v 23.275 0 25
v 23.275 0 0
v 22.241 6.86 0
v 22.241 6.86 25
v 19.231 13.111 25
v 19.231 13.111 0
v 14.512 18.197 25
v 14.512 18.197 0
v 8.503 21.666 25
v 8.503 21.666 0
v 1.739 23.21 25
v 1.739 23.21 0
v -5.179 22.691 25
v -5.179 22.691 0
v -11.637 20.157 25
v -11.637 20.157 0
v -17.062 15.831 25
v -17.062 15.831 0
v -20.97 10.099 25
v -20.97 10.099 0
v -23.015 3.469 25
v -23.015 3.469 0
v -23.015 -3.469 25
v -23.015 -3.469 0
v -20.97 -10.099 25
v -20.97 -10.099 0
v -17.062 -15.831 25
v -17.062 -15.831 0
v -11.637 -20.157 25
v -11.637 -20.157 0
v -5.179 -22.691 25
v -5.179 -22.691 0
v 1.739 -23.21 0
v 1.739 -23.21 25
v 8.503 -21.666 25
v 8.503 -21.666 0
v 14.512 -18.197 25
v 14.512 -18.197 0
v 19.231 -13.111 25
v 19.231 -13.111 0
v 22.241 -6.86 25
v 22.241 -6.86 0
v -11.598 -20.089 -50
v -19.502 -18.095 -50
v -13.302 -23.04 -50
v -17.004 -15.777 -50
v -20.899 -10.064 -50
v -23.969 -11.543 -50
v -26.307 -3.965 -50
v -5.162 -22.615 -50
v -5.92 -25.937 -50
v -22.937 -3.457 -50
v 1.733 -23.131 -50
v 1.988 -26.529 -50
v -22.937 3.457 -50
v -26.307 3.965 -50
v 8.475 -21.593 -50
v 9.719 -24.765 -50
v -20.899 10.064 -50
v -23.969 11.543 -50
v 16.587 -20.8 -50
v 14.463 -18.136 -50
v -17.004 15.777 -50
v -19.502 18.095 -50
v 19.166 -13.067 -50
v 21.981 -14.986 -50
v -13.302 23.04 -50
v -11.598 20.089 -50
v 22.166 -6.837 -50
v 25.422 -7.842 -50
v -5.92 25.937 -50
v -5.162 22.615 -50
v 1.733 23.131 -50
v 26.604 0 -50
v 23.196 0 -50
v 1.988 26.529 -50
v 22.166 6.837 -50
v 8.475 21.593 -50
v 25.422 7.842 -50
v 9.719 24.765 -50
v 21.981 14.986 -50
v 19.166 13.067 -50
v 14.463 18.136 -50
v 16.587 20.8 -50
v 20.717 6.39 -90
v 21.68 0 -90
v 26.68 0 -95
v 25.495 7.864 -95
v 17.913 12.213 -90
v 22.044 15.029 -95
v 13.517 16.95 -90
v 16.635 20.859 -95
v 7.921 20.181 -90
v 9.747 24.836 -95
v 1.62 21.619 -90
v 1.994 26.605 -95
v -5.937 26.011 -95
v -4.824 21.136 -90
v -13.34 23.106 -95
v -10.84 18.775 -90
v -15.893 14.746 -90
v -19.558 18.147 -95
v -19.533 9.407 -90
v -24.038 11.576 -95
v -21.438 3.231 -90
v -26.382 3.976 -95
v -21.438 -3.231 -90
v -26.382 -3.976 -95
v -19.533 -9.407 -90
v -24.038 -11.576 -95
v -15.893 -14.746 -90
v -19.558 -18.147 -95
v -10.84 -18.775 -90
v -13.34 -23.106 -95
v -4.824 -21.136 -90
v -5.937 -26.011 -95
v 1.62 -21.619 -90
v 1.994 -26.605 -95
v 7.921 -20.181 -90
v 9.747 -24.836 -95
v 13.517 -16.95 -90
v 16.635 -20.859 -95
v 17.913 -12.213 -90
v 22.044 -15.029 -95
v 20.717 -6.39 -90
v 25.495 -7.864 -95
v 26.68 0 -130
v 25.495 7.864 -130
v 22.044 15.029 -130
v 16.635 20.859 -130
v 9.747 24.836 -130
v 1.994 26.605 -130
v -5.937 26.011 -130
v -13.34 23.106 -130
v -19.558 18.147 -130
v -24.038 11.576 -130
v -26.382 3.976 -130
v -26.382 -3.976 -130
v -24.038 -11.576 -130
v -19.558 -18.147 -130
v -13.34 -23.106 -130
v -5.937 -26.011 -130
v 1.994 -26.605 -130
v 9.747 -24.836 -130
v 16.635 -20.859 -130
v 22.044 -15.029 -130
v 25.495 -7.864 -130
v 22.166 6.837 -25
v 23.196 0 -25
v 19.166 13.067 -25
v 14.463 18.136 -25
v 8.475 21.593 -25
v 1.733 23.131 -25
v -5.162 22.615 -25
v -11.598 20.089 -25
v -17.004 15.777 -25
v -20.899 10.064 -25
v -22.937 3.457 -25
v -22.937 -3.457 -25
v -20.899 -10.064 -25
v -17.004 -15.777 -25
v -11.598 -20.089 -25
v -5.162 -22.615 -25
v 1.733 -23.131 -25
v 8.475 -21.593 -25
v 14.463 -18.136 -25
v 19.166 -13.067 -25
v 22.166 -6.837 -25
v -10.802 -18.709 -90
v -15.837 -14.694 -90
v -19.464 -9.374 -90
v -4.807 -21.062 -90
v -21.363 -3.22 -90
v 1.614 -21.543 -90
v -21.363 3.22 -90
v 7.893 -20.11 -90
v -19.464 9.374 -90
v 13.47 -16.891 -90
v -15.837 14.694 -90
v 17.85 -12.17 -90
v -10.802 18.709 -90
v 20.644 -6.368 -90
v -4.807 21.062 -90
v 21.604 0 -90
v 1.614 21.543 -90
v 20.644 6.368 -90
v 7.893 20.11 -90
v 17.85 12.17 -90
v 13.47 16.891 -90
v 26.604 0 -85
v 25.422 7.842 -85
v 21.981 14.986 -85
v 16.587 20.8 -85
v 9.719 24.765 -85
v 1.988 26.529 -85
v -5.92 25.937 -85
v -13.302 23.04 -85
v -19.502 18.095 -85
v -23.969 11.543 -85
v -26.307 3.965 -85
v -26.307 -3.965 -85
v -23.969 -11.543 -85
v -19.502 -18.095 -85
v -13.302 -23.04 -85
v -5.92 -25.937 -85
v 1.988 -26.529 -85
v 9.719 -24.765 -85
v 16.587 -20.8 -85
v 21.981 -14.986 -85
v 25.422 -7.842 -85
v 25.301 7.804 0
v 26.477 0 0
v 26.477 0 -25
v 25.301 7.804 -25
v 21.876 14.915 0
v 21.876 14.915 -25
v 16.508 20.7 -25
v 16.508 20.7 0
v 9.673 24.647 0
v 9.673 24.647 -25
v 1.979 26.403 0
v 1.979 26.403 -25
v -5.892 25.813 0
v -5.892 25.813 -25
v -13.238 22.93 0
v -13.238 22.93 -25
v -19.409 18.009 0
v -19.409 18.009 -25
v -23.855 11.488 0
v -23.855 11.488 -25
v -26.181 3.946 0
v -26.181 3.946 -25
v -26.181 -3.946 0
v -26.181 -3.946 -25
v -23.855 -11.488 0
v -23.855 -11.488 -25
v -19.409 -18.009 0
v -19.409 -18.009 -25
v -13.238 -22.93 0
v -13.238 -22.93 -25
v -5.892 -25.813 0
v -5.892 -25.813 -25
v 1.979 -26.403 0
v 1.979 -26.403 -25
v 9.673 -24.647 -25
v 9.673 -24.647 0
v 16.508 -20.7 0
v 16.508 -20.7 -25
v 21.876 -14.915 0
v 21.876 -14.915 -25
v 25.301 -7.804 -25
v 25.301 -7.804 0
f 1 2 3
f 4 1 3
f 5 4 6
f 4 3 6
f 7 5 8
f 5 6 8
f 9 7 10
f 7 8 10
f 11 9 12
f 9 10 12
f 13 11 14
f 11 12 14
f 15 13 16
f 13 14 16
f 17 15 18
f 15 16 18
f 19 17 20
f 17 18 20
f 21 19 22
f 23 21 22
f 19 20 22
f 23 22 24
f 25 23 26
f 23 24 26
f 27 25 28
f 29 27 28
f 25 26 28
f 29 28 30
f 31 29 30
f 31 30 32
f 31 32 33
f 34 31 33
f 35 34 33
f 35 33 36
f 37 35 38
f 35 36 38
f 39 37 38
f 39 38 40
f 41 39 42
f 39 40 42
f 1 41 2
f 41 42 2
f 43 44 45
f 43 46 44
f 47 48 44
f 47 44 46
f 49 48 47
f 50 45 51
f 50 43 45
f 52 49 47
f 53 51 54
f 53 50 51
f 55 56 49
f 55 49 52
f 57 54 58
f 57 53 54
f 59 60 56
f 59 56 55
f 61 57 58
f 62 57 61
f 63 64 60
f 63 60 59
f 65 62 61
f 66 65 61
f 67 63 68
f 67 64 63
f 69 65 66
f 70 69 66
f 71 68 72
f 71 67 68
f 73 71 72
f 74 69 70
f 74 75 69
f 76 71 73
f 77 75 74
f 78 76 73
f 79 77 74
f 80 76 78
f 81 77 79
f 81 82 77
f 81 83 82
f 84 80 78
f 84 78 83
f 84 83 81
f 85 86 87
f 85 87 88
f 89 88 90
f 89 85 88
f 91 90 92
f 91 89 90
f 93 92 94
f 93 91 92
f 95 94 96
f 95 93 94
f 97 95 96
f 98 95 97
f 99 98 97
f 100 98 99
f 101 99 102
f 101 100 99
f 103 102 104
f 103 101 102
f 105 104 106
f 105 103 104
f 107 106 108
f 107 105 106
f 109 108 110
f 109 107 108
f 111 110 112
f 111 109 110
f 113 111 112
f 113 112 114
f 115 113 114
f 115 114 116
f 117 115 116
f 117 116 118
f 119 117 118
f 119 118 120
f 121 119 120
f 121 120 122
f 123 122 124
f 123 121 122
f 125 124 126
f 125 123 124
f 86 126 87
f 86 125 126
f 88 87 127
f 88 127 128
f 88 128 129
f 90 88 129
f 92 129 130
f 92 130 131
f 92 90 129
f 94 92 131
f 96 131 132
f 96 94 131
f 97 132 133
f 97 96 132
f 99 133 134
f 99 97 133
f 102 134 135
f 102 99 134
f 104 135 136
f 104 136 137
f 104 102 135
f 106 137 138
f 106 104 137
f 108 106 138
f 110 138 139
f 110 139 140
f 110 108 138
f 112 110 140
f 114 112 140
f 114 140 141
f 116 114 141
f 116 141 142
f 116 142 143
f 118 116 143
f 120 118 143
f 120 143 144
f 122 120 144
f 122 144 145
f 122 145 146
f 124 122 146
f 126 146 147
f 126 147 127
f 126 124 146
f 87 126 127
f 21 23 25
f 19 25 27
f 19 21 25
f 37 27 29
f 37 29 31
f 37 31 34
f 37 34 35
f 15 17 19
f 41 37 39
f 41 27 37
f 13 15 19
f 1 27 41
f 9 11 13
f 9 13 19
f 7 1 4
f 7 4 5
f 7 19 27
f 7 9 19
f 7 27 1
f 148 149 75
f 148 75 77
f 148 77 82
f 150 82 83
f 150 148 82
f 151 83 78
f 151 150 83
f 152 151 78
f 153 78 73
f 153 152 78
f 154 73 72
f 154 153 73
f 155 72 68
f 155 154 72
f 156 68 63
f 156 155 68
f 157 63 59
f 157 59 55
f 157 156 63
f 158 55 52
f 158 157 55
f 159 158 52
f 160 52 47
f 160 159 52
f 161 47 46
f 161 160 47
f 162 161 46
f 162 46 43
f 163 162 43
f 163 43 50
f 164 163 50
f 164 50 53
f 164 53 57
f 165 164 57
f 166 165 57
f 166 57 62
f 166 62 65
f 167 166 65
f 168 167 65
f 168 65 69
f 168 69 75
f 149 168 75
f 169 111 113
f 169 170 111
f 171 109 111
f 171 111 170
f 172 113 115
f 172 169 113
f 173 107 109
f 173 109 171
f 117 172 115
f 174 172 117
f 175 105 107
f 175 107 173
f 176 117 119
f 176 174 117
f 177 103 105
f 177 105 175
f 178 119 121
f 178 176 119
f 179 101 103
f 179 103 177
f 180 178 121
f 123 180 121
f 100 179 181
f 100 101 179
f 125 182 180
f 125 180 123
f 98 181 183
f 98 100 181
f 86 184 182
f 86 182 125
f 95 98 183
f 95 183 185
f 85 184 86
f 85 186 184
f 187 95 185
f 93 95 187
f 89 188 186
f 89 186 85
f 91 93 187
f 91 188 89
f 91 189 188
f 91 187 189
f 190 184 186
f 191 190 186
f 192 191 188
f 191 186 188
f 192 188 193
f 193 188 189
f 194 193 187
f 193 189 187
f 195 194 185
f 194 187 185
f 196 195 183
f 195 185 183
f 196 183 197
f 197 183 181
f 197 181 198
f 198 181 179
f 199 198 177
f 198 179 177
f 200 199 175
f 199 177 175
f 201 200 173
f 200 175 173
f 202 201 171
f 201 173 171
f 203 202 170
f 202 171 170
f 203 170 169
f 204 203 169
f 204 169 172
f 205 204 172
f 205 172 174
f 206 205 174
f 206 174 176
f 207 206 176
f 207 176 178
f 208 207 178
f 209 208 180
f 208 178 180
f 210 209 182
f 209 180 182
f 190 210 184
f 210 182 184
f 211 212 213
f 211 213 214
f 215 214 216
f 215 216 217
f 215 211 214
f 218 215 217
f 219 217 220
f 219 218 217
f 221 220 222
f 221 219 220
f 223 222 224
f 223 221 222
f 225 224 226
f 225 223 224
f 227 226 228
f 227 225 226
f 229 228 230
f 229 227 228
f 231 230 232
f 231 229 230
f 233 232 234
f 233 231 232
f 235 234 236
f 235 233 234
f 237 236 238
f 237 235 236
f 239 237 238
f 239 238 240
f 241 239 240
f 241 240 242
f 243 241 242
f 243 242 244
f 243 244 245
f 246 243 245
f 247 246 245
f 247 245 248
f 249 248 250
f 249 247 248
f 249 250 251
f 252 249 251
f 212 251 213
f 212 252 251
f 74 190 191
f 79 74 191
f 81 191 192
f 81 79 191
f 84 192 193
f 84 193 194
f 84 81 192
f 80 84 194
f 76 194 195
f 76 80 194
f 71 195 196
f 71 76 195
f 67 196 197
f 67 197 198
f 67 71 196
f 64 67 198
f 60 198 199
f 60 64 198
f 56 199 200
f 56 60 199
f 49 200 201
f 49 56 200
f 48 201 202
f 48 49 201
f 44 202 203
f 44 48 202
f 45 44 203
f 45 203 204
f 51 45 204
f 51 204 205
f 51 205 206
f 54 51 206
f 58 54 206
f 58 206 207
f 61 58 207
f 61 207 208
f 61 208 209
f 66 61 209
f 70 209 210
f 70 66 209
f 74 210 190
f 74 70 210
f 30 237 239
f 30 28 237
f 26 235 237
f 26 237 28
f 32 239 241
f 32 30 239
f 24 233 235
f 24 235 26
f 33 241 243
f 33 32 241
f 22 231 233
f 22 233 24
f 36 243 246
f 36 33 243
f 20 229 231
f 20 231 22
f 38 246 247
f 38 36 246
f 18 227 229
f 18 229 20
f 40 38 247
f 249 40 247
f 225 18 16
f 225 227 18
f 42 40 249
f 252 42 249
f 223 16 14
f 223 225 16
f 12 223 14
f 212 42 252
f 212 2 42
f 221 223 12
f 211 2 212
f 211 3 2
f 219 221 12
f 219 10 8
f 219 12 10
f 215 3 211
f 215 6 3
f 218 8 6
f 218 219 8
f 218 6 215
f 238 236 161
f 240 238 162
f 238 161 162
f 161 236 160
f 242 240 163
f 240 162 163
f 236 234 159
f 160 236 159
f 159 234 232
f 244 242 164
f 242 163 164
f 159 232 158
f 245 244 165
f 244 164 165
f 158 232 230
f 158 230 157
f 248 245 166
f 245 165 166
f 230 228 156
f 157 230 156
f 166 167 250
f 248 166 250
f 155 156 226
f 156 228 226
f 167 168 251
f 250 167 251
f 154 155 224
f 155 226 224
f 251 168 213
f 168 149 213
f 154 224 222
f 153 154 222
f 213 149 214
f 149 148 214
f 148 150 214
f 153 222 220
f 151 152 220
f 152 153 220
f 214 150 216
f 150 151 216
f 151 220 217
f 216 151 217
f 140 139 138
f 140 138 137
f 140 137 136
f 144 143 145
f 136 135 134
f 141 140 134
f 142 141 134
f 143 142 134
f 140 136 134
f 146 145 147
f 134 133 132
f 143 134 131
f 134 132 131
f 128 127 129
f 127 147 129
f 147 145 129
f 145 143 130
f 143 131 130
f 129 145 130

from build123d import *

# Parameters (mm, degrees)
F0_R      = 23.274843
F1_DEPTH  = 25
F2_R      = 26.476855
F3_DEPTH  = 25
F4_R      = 23.196294
F5_DEPTH  = 50
F7_R      = 26.603846
F8_DEPTH  = 40
F9_SIZE   = 5
F11_R     = 26.680042
F12_DEPTH = 40
F13_SIZE  = 5


with BuildPart() as f1:
    # F0 (on Top) → F1 (new body)
    with BuildSketch(Plane.XY):
        Circle(F0_R)
    extrude(amount=F1_DEPTH)

    # F2 (on Top) → F3 (join)
    with BuildSketch(Plane.XY):
        Circle(F2_R)
    extrude(amount=-F3_DEPTH)

    # F4 (on Top) → F5 (join)
    with BuildSketch(Plane.XY):
        Circle(F4_R)
    extrude(amount=-F5_DEPTH)

    # F7 (on offset) → F8 (join)
    with BuildSketch(Plane.XY.offset(-50)):
        Circle(F7_R)
    extrude(amount=-F8_DEPTH)

    # F9
    f9_edges = [f1.edges().sort_by_distance(p)[0] for p in [
        (-26.603846, 0, -90),
    ]]
    chamfer(f9_edges, length=F9_SIZE)

    # F11 (on offset) → F12 (join)
    with BuildSketch(Plane.XY.offset(-90)):
        Circle(F11_R)
    extrude(amount=-F12_DEPTH)

    # F13
    f13_edges = [f1.edges().sort_by_distance(p)[0] for p in [
        (-26.680042, 0, -90),
    ]]
    chamfer(f13_edges, length=F13_SIZE)


solid = f1.part
